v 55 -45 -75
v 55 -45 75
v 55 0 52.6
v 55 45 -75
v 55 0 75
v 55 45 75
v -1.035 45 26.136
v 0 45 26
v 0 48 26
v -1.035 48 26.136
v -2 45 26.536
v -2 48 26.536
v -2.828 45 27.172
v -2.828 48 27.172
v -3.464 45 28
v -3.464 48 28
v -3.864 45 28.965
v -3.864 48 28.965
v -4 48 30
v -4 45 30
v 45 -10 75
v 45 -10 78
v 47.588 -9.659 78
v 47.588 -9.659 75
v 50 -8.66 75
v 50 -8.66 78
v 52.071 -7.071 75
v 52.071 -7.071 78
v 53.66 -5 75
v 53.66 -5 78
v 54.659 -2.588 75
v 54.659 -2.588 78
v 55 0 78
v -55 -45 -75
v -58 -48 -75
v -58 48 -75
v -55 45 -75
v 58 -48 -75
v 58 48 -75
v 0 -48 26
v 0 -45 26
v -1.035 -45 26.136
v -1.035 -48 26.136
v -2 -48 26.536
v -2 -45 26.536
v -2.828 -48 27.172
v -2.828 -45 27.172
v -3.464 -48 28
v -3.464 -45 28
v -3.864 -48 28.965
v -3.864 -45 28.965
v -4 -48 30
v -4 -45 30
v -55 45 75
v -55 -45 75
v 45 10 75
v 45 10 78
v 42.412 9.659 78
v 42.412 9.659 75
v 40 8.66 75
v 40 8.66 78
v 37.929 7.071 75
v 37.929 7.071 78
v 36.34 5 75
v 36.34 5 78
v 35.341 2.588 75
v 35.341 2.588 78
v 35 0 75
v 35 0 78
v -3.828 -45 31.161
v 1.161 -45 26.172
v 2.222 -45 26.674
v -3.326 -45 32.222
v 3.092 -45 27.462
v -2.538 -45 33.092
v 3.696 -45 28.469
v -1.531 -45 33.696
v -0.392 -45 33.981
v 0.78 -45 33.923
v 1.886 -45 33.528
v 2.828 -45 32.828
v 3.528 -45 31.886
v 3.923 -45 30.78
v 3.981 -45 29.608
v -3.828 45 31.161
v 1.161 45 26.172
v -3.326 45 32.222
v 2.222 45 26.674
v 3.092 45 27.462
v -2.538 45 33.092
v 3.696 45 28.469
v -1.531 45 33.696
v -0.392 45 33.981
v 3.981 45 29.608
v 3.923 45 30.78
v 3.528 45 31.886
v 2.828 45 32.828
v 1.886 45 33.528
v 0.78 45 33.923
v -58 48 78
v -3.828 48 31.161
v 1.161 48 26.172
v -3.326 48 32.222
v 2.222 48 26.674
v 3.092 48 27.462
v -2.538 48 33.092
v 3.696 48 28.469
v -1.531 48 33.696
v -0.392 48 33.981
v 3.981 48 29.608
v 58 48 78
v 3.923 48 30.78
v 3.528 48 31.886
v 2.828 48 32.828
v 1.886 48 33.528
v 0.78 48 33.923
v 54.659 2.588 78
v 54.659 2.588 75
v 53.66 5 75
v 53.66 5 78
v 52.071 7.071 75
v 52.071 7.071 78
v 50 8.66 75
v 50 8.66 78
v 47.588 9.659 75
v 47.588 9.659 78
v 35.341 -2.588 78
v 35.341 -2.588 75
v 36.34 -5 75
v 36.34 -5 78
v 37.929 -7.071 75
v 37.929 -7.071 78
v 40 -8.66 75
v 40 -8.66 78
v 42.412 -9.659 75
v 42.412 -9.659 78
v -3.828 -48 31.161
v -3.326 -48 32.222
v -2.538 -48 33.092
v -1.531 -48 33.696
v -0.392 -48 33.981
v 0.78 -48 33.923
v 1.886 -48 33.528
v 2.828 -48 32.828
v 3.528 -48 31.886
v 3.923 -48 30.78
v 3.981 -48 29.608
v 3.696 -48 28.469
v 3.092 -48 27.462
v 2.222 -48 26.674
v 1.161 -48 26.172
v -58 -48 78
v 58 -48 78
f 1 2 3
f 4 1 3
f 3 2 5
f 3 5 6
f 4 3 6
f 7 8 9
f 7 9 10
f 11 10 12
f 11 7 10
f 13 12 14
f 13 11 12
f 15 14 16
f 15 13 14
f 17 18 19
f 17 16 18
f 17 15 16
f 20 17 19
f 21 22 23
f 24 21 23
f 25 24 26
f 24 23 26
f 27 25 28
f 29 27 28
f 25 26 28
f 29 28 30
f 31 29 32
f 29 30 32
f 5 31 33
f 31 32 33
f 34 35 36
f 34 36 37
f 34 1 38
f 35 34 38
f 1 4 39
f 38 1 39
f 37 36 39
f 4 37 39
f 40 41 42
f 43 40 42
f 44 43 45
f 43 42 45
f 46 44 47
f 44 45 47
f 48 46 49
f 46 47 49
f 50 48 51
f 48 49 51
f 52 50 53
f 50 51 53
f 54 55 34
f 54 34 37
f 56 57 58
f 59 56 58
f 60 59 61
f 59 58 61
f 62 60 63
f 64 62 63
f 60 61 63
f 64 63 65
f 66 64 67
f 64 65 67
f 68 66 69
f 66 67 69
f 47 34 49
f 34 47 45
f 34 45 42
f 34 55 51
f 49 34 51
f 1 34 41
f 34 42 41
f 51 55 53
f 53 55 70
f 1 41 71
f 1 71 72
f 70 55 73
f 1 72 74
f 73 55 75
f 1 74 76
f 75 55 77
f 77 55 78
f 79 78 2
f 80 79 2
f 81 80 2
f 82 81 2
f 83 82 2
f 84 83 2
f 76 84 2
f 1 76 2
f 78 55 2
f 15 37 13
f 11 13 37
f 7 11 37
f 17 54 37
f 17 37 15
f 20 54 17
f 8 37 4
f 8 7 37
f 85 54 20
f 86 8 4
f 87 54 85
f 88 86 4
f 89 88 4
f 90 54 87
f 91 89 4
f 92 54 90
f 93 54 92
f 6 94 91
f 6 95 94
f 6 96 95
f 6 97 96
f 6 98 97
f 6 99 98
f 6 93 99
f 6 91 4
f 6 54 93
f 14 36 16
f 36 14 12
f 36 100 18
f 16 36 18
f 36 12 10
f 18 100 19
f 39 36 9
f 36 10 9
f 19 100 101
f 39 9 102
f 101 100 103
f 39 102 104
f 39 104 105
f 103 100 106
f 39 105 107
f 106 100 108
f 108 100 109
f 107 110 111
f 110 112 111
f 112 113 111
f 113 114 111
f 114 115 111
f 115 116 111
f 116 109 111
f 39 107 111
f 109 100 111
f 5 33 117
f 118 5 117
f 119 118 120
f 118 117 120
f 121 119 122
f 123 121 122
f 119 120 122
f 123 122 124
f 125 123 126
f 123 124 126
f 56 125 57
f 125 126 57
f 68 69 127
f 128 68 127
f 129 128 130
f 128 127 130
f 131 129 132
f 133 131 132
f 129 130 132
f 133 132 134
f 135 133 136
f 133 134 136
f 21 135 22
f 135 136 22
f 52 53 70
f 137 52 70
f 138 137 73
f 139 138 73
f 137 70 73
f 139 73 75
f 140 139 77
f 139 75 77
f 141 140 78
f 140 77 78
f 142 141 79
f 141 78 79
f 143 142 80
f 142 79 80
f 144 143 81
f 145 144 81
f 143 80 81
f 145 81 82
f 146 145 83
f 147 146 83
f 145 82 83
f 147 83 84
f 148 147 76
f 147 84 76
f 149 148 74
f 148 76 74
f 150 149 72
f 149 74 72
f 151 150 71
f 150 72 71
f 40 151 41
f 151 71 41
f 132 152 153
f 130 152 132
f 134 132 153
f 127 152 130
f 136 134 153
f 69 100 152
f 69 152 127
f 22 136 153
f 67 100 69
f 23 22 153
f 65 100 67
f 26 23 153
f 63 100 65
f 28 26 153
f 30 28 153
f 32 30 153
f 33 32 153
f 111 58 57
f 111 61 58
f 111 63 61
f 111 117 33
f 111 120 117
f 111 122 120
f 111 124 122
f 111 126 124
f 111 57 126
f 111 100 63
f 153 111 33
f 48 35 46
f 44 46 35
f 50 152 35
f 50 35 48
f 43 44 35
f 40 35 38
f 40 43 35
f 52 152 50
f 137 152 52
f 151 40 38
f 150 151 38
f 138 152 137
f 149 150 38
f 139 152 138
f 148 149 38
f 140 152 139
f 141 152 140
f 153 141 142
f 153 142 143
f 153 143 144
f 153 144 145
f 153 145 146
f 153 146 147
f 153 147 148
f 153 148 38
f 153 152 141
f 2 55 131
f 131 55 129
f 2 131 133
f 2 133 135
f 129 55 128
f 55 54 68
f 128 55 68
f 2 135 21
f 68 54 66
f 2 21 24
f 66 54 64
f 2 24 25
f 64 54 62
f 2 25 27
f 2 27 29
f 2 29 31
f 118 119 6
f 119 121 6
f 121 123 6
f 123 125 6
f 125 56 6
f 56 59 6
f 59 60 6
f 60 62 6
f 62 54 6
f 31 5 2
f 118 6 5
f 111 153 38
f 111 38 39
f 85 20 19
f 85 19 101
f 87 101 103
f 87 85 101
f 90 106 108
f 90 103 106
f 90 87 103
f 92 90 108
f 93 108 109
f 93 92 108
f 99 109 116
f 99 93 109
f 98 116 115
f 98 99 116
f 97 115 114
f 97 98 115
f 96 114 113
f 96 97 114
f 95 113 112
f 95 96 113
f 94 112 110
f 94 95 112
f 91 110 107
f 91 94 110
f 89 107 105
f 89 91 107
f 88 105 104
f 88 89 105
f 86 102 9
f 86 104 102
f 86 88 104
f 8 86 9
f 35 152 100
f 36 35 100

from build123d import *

# Parameters (mm, degrees)
F0_W          = 110
F0_H          = 90
F1_DEPTH      = 75
F2_T          = 3
F4_DEPTH      = 25.4
F6_DEPTH      = 25.4
F6_DEPTH_BACK = 126.746


with BuildPart() as f1:
    # F0 (on Top) → F1 (new body, symmetric)
    with BuildSketch(Plane.XY):
        Rectangle(F0_W, F0_H)
    extrude(amount=F1_DEPTH, both=True)

    # F2
    f2_openings = [f1.faces().sort_by_distance(p)[0] for p in [
        (0, 0, -75),
    ]]
    offset(amount=F2_T, openings=f2_openings, kind=Kind.INTERSECTION)

    # F3 (on face) → F4 (cut)
    with BuildSketch(Plane.XY.offset(78)):
        with BuildLine():
            ThreePointArc((45, -10), (52.0710678119, -7.0710678119), (55, 0))
            ThreePointArc((55, 0), (52.0710678119, 7.0710678119), (45, 10))
            ThreePointArc((45, 10), (37.9289321881, 7.0710678119), (35, 0))
            ThreePointArc((35, 0), (37.9289321881, -7.0710678119), (45, -10))
        make_face()
    extrude(amount=-F4_DEPTH, mode=Mode.SUBTRACT)

    # F5 (on face) → F6 (cut, two sides)
    with BuildSketch(Plane(origin=(0, -45, 0), x_dir=(-1, 0, 0), z_dir=(0, 1, 0))) as f6_sk:
        with BuildLine():
            ThreePointArc((4, 30), (-2.8284271247, 32.8284271247), (0, 26))
            ThreePointArc((0, 26), (2.8284271247, 27.1715728753), (4, 30))
        make_face()
    extrude(amount=-F6_DEPTH, mode=Mode.SUBTRACT)
    extrude(f6_sk.sketch, amount=F6_DEPTH_BACK, mode=Mode.SUBTRACT)


solid = f1.part
